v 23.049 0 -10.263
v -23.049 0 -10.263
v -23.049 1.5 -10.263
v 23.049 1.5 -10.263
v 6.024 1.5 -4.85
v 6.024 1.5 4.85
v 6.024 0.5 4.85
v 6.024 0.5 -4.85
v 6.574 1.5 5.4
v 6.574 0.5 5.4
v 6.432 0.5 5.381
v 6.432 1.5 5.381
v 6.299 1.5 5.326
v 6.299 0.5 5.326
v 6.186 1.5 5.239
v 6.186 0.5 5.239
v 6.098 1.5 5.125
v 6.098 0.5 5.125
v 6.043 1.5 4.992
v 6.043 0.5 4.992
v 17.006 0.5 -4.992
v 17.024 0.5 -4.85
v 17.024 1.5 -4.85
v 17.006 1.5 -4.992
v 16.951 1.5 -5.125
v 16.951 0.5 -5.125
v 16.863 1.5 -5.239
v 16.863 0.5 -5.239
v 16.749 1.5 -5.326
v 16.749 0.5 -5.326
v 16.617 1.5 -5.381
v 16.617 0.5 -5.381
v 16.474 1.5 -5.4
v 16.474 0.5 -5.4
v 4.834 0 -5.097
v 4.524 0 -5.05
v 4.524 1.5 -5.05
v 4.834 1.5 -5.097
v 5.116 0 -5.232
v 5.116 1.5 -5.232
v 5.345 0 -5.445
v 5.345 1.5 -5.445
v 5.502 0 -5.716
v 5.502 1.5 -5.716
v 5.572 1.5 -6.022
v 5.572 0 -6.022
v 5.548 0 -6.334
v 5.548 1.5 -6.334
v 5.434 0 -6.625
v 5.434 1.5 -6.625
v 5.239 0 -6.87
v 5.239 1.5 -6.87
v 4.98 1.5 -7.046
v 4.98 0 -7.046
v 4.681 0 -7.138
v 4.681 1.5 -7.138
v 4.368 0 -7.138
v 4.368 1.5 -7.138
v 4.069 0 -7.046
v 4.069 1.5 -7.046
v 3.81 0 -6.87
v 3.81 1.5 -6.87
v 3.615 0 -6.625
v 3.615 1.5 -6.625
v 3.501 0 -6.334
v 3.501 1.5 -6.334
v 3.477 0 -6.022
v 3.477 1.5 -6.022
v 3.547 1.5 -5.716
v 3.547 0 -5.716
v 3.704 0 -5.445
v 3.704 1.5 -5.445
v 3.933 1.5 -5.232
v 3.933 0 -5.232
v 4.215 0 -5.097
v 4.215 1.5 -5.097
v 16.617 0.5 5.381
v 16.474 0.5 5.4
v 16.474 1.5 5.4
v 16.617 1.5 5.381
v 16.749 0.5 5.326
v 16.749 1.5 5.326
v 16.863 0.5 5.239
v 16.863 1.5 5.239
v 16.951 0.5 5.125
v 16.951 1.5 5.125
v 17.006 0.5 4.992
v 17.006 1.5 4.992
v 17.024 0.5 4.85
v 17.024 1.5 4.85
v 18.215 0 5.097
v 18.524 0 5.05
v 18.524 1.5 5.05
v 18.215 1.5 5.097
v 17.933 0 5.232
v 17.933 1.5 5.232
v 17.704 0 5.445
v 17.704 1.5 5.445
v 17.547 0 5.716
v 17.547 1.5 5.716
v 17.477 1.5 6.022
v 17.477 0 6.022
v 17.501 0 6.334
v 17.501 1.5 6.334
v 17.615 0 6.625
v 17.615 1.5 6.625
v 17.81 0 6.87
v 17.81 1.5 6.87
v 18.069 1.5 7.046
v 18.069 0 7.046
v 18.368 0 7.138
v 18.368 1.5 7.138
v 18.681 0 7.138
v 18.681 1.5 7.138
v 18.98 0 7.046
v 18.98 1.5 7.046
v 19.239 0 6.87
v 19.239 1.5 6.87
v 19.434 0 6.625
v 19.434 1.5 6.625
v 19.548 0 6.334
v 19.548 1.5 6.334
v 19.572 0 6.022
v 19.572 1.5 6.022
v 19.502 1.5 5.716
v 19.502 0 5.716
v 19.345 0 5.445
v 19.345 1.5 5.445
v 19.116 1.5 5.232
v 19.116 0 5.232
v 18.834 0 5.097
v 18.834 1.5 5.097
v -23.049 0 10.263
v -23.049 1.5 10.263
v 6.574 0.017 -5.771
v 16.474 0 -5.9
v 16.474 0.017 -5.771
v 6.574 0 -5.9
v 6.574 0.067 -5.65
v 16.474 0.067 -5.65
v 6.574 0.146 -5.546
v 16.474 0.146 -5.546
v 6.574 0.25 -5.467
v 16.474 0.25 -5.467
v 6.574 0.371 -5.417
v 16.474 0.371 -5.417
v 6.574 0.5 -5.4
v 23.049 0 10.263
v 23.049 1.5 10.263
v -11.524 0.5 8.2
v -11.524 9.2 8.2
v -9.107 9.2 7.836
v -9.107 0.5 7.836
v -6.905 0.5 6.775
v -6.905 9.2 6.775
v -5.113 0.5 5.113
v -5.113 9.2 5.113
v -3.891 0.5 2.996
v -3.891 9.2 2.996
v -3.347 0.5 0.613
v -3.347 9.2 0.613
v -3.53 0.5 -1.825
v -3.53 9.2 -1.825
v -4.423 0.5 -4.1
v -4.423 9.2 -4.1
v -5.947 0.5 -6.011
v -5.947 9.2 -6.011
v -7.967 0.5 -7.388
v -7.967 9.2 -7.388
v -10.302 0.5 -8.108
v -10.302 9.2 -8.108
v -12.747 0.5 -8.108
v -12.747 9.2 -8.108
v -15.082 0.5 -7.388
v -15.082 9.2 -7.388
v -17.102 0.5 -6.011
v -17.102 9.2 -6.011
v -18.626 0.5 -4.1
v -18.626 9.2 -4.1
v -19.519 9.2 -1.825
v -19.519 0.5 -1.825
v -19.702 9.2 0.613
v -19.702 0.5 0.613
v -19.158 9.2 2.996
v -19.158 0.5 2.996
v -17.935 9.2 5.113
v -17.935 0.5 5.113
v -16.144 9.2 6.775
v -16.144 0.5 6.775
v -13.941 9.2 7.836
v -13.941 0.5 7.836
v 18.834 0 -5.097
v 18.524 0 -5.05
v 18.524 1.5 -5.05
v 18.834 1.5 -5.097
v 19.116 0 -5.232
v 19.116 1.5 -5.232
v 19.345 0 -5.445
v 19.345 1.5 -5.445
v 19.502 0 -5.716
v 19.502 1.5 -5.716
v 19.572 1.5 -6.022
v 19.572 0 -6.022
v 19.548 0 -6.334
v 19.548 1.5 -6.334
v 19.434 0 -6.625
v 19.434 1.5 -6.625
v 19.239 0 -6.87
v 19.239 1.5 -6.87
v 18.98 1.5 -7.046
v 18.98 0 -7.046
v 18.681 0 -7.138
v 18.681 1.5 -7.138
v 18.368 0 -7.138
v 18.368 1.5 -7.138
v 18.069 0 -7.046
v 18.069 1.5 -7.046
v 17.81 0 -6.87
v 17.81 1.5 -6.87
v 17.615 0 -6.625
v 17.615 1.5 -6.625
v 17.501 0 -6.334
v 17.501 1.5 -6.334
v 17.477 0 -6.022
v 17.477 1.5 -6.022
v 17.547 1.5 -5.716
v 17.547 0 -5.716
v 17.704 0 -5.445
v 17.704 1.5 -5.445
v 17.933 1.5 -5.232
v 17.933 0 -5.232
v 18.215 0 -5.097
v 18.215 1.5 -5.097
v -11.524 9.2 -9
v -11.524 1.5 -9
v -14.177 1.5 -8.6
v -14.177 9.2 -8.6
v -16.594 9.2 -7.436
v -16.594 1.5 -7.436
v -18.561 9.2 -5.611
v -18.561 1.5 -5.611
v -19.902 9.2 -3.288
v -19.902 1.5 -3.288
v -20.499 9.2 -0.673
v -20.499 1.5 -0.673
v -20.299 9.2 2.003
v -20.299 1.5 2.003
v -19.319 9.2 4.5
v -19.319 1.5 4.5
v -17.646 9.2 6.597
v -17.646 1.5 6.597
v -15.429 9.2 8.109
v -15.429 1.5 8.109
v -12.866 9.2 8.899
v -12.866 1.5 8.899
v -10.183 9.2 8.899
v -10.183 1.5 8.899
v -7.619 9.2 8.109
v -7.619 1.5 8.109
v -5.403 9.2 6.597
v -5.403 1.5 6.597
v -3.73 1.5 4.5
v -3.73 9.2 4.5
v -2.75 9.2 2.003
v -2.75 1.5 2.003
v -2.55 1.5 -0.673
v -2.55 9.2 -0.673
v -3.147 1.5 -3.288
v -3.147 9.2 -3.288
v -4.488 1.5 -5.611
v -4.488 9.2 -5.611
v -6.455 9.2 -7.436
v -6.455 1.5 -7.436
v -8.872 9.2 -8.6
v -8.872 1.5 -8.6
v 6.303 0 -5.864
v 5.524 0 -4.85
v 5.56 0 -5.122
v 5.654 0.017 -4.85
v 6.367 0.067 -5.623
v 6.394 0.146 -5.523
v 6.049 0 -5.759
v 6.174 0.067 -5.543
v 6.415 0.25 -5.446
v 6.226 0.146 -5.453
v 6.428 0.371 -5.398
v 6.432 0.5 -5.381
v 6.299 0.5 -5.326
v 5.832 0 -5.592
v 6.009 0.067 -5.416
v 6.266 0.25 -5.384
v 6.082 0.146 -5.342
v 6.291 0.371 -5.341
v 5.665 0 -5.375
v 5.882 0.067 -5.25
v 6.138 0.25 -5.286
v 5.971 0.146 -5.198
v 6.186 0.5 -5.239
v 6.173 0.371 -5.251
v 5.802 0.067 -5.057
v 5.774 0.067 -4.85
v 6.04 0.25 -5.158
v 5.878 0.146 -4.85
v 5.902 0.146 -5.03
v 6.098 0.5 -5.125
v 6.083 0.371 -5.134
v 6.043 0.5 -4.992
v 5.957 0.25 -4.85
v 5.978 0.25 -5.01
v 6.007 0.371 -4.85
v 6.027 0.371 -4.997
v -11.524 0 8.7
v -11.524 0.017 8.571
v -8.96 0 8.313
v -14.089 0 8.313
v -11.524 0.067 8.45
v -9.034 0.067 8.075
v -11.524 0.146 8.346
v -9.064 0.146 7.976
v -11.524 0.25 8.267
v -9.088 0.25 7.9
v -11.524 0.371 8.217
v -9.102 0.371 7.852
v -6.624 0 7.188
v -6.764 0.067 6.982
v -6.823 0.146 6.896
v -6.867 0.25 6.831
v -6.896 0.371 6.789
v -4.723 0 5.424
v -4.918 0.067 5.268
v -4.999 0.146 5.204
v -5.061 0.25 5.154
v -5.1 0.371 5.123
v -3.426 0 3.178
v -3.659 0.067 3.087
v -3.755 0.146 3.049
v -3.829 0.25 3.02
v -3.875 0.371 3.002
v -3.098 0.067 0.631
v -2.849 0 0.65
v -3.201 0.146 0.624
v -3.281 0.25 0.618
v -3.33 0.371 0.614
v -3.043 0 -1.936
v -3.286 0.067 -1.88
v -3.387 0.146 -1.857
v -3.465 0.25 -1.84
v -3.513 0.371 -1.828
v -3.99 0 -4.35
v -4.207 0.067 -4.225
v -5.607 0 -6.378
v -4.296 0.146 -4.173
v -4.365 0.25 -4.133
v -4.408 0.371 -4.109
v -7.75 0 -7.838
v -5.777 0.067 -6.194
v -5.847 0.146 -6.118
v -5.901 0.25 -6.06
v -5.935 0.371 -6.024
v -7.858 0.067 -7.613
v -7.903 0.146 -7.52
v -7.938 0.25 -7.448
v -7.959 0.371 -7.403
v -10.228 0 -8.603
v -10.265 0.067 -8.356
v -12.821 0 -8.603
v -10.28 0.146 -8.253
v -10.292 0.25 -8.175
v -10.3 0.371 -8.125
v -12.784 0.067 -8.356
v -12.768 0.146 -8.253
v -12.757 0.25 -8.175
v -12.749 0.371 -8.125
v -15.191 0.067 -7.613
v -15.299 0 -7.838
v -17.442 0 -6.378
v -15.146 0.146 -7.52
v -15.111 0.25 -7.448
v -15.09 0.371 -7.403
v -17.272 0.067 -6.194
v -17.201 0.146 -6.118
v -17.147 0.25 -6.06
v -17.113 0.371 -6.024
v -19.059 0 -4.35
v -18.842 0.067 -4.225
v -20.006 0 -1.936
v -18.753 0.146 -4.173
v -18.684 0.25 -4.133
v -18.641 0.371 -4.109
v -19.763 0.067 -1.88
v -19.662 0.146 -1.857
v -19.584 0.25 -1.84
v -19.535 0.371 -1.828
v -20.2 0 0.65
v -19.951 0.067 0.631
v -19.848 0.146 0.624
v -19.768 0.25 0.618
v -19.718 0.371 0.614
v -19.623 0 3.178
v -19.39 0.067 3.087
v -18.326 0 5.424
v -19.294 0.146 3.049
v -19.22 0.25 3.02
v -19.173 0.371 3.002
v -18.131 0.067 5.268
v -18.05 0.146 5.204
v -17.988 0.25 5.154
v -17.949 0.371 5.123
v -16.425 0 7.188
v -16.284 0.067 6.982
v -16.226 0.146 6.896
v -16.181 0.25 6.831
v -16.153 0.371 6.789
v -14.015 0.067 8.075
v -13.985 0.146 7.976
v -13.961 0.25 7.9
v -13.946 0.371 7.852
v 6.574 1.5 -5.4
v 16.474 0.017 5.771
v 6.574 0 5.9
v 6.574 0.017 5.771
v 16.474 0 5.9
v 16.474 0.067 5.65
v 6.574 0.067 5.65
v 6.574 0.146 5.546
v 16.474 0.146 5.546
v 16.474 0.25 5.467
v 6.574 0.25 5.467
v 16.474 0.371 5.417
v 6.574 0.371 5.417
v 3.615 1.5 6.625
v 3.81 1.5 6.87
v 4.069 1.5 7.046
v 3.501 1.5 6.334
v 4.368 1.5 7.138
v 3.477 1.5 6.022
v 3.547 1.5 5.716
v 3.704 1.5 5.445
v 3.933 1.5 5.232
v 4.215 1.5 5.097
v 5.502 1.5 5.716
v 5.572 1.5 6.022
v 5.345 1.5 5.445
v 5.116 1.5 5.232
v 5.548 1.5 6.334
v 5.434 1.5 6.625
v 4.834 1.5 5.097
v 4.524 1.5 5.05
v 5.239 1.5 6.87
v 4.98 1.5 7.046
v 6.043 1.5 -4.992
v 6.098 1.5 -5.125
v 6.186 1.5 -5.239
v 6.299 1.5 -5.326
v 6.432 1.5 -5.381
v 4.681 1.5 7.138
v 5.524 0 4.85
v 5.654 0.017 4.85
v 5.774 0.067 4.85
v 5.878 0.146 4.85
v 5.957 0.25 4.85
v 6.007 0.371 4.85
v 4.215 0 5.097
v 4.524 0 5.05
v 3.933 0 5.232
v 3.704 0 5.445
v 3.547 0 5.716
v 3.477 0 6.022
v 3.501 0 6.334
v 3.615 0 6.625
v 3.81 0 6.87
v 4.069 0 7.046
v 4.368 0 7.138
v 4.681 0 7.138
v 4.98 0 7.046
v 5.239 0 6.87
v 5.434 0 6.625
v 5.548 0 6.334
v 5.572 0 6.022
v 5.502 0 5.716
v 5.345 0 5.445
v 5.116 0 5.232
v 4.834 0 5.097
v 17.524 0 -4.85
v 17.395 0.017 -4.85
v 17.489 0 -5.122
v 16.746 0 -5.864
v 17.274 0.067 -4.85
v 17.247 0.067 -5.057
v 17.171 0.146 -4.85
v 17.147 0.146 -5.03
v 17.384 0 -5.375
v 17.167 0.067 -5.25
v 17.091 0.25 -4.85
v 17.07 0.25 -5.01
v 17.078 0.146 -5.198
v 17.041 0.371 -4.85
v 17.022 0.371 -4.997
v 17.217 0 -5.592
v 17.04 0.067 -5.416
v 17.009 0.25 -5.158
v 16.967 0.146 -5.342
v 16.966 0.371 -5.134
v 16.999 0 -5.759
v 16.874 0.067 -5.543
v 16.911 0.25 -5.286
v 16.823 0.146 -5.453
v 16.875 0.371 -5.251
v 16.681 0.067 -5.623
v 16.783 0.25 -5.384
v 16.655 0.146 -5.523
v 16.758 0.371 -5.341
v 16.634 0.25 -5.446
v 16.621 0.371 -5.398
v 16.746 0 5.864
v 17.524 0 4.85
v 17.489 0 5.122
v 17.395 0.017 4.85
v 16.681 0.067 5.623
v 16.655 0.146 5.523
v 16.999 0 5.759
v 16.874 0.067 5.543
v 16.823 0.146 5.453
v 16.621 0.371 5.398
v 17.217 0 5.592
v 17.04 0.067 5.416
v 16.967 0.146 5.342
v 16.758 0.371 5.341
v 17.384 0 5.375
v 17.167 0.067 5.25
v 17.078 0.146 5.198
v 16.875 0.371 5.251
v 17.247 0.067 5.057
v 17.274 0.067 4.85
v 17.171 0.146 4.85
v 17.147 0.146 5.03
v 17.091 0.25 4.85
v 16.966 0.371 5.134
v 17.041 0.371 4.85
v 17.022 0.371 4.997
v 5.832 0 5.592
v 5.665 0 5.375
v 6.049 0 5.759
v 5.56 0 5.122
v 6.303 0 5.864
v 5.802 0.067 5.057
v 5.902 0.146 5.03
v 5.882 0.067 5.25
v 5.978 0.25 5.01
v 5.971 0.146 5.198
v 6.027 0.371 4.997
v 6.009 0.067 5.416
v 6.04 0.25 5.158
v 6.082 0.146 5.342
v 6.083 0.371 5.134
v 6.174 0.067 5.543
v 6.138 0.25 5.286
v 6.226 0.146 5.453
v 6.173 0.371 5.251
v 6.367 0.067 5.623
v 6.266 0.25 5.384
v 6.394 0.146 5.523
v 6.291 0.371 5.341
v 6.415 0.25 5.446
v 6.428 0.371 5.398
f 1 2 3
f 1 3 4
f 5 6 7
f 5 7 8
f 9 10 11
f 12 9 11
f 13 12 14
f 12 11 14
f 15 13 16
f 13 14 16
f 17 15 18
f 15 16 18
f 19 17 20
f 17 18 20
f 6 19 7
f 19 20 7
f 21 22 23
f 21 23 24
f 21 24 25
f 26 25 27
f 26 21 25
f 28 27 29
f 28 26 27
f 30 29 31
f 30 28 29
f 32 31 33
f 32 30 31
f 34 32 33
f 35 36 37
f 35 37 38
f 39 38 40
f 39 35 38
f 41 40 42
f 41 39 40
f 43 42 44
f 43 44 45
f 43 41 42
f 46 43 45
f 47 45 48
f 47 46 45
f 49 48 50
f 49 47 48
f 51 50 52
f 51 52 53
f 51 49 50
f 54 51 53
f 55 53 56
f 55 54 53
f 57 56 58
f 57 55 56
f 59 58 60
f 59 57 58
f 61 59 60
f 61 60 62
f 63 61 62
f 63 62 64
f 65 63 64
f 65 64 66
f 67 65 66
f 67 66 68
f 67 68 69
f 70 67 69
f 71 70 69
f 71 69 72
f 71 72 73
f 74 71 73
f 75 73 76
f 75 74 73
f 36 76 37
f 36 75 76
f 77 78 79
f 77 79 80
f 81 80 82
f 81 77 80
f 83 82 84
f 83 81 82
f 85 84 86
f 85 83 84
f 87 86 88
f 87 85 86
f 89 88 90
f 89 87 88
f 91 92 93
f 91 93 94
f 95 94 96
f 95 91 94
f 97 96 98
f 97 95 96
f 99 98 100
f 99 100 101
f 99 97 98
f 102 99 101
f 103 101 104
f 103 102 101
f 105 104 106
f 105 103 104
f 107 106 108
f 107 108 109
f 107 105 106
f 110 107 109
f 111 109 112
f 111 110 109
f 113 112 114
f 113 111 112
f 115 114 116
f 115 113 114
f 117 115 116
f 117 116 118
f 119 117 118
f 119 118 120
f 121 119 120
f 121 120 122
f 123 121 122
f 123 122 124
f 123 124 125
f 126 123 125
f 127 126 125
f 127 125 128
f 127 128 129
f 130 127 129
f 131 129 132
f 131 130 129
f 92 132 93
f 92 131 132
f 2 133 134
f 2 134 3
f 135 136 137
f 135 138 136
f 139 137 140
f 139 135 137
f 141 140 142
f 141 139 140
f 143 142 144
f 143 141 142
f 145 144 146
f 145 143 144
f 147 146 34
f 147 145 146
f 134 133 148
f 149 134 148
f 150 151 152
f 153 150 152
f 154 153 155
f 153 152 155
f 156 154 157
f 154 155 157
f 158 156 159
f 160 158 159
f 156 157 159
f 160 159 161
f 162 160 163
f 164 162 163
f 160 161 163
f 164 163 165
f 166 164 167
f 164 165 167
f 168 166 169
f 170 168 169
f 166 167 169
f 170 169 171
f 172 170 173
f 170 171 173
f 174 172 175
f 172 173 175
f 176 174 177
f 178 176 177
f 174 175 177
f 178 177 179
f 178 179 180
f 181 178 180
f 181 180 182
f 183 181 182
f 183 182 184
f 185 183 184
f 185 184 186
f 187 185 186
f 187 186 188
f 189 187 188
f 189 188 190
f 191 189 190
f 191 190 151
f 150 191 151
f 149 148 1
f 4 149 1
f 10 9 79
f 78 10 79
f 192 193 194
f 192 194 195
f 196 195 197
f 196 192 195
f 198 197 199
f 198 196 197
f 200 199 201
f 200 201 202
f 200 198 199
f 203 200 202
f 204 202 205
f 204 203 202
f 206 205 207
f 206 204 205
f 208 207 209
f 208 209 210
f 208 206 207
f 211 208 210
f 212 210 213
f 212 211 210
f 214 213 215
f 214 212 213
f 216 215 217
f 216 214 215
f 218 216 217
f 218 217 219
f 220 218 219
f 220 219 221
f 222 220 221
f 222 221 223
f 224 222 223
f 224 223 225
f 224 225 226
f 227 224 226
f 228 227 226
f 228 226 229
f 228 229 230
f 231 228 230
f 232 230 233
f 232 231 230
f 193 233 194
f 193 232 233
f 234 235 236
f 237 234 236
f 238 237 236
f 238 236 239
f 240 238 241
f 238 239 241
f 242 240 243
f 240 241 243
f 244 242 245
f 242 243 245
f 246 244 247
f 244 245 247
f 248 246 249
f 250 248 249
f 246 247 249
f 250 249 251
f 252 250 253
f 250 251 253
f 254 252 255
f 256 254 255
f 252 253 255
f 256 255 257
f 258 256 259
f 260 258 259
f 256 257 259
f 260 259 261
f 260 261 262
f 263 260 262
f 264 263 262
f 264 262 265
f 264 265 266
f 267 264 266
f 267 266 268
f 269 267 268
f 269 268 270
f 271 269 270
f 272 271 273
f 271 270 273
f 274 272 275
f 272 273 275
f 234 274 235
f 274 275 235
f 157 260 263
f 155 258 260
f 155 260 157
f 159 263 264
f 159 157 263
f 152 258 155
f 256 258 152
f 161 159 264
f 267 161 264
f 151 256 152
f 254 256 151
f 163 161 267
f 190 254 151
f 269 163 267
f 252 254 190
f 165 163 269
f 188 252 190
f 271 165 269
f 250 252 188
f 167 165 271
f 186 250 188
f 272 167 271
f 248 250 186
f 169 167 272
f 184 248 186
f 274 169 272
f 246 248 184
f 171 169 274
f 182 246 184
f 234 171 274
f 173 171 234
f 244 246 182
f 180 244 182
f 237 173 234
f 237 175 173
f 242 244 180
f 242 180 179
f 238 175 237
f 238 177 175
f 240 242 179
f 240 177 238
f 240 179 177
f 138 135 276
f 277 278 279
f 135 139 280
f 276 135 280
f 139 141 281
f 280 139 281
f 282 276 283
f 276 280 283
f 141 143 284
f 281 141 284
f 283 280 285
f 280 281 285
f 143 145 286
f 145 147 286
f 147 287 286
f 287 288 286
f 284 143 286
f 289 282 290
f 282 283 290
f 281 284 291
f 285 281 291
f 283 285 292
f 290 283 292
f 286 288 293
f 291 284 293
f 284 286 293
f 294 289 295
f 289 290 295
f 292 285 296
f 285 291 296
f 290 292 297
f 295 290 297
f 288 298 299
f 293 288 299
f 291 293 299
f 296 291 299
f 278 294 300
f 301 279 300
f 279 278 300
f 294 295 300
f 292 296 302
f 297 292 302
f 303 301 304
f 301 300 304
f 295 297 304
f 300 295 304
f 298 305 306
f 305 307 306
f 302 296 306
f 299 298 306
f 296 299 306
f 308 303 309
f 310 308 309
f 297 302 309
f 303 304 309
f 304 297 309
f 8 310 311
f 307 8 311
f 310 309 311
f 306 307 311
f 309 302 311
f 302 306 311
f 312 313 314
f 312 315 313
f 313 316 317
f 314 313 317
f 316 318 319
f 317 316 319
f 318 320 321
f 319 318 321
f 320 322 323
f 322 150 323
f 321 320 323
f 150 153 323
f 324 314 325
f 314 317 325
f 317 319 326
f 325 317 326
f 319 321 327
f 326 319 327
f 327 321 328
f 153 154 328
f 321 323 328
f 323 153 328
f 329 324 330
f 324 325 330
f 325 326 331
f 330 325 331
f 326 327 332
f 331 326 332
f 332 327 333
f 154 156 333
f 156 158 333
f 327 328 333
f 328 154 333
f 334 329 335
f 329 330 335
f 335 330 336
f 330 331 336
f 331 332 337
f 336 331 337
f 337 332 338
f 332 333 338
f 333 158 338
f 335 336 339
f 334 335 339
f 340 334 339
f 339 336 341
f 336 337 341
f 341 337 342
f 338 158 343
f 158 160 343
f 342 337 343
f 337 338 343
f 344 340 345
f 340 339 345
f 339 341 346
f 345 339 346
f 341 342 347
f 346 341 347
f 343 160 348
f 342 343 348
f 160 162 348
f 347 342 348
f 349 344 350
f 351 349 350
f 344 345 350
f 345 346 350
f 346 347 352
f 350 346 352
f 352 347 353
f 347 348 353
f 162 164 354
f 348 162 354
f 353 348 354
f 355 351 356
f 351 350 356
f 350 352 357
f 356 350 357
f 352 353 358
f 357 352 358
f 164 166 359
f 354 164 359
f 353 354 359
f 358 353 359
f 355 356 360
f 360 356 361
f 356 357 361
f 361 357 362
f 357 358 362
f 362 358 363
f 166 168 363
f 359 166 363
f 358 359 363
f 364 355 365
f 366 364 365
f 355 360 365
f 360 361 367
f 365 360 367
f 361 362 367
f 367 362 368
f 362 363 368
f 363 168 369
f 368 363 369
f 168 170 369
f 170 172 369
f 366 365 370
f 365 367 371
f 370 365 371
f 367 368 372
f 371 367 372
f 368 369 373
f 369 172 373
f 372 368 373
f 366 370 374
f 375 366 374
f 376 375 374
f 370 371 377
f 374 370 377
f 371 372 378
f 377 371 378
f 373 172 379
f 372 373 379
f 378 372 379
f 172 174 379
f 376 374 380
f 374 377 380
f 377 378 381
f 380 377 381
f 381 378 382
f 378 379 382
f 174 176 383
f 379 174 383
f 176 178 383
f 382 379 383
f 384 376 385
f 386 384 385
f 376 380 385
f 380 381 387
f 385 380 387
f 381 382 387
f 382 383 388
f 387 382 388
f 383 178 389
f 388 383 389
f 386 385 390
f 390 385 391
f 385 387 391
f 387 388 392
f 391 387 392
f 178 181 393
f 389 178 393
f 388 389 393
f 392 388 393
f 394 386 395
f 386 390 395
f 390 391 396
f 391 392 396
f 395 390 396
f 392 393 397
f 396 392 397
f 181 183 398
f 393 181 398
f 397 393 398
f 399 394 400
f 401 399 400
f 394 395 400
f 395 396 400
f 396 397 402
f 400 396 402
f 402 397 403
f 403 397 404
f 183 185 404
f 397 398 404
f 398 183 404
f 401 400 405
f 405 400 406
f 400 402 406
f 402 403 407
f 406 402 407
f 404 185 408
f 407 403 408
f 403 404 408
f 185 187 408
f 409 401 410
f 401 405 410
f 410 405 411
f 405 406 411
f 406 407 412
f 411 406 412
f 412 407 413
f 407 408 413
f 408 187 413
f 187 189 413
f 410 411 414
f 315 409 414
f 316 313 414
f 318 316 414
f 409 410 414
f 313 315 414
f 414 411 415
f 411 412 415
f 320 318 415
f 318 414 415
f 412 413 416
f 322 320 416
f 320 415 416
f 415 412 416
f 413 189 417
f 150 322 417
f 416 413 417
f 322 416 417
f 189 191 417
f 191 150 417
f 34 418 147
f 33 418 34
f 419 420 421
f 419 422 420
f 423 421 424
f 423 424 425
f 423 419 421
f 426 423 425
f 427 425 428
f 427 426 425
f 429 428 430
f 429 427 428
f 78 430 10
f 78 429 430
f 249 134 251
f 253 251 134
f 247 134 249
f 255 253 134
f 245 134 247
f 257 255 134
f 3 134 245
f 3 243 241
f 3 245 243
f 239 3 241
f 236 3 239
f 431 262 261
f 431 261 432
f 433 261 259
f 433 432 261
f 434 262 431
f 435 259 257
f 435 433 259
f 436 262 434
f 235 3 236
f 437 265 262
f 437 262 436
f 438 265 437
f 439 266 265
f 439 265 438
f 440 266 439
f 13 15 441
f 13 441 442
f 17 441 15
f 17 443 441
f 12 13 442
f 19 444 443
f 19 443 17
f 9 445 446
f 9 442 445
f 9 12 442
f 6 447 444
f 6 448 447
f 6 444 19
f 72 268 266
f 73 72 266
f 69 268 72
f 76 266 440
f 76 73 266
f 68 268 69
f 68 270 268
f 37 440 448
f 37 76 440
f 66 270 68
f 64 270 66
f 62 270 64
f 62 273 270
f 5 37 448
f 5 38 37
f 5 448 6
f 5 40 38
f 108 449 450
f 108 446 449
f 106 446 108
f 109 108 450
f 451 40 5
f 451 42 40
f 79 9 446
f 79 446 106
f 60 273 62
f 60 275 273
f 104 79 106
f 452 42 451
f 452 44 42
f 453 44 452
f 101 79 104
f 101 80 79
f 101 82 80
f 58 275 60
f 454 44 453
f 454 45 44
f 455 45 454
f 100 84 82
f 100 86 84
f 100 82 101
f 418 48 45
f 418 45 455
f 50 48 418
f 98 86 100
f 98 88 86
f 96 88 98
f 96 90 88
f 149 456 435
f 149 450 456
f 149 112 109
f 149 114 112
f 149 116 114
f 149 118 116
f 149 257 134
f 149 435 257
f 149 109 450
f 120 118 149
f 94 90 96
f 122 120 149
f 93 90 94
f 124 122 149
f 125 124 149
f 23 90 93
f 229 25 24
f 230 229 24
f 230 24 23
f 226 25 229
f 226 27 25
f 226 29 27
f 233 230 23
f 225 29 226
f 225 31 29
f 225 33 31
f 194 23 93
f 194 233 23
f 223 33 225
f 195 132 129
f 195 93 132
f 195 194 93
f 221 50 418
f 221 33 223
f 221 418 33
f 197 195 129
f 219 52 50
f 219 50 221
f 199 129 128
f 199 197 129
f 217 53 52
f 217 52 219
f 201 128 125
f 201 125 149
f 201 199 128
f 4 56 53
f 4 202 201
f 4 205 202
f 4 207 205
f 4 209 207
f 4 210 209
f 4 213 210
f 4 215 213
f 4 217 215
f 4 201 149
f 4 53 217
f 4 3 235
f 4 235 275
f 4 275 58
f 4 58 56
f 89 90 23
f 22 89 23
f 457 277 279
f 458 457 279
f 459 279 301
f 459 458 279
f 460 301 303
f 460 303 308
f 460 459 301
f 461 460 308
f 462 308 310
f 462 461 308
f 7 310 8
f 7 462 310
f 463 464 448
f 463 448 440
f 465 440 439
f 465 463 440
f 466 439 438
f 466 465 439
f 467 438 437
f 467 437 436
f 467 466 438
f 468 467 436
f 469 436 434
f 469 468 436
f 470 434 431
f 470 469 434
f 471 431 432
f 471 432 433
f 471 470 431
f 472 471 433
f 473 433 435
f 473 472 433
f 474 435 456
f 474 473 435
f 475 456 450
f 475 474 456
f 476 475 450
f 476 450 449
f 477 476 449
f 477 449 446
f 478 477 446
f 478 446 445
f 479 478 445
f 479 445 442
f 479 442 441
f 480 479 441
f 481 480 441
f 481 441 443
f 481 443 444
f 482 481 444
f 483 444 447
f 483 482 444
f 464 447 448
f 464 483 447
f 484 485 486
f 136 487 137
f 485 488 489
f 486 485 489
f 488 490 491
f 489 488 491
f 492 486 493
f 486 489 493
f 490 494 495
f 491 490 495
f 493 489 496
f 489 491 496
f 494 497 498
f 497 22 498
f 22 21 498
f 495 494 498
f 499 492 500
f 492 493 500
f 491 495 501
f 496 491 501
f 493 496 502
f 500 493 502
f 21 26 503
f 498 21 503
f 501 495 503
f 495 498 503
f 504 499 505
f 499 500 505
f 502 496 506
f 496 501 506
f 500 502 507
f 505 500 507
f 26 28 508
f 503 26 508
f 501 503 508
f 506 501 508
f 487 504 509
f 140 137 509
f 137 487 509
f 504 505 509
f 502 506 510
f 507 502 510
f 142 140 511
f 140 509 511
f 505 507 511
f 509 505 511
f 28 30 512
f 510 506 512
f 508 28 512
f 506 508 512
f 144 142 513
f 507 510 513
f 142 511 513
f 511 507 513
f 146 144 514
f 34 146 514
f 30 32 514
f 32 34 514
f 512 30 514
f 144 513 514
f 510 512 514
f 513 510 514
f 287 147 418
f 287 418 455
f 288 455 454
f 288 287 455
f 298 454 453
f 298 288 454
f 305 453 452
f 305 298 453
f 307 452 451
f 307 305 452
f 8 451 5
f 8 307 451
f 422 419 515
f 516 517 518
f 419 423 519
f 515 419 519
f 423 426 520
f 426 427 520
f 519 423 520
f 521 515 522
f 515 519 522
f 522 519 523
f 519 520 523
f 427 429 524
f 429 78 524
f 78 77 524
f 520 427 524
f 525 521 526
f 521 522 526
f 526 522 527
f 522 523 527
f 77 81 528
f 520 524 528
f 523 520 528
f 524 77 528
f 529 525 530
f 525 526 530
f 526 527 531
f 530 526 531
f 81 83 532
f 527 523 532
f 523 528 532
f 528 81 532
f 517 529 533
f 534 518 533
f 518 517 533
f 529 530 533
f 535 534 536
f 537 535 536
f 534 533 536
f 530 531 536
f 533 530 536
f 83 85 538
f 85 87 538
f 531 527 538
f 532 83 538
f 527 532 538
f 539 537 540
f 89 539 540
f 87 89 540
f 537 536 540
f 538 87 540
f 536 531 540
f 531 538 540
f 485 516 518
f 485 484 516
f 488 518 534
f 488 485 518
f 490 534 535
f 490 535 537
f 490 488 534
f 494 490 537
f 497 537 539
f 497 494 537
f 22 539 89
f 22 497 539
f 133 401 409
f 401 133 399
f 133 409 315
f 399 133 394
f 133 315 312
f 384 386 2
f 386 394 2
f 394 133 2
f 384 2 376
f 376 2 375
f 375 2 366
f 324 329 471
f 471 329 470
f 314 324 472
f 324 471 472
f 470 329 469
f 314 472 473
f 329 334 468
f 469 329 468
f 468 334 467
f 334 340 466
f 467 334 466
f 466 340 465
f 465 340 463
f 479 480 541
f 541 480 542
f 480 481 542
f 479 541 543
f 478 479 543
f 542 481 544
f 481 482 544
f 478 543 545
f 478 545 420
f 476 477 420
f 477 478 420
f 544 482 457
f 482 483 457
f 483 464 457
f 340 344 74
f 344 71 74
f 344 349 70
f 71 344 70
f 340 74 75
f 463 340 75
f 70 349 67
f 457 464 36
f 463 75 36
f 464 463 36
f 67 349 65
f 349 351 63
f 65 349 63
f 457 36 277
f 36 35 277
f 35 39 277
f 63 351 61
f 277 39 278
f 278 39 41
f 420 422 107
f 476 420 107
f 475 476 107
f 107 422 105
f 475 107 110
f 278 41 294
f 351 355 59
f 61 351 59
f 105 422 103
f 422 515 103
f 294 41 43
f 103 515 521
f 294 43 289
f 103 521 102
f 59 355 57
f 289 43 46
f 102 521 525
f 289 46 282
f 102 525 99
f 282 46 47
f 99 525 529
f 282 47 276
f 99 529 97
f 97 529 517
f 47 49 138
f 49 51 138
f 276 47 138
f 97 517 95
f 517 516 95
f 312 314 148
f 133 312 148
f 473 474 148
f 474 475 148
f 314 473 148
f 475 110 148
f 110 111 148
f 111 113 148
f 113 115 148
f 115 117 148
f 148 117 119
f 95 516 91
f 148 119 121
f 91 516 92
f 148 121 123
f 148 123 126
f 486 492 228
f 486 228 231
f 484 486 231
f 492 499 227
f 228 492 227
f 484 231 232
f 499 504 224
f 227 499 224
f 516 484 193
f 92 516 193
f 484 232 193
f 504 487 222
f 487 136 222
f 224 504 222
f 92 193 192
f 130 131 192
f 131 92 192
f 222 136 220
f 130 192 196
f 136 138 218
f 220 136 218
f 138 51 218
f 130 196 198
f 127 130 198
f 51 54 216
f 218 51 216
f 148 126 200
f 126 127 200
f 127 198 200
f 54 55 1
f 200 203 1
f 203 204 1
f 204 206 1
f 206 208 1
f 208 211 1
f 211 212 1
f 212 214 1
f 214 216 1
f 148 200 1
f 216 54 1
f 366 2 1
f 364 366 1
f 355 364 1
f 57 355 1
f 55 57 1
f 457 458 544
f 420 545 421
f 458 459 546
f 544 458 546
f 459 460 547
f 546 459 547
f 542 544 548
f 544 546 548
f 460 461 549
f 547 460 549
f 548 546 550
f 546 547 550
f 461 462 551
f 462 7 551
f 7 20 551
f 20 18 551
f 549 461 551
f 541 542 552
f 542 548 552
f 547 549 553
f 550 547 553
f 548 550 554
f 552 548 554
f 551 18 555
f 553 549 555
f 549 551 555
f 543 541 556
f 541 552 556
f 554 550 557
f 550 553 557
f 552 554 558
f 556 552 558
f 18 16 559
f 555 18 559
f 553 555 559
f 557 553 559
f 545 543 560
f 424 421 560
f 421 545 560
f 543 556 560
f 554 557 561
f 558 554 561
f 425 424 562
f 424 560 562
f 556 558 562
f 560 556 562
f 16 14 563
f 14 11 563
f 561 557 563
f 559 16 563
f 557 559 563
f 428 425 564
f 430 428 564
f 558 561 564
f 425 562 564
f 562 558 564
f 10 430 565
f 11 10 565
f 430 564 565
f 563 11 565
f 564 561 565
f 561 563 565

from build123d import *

# Parameters (mm, degrees)
CROQUIS1_W              = 46.097746062
CROQUIS1_H              = 20.525775368
CROQUIS1_R              = 1.05
SALIENTE_EXTRUIR1_DEPTH = 1.5
CROQUIS4_W              = 11
CROQUIS4_H              = 10.8
CORTAR_EXTRUIR1_DEPTH   = 1.5
REDONDEO1_R             = 0.55
CROQUIS7_R              = 9
SALIENTE_EXTRUIR3_DEPTH = 7.7
CROQUIS8_R              = 8.2
CORTAR_EXTRUIR3_DEPTH   = 27.855491275
REDONDEO2_R             = 0.5
REDONDEO3_R             = 0.5


with BuildPart() as part:
    # Croquis1 → Saliente-Extruir1 (new body)
    with BuildSketch(Plane(origin=(0, 0, 0), x_dir=(1, 0, 0), z_dir=(0, 1, 0))):
        Rectangle(CROQUIS1_W, CROQUIS1_H)
        with Locations(Location((4.524436516, 6.1, 0), (0, 0, 270))):
            Circle(CROQUIS1_R, mode=Mode.SUBTRACT)
        with Locations(Location((18.524436516, 6.1, 0), (0, 0, 270))):
            Circle(CROQUIS1_R, mode=Mode.SUBTRACT)
        with Locations(Location((18.524436516, -6.1, 0), (0, 0, 90))):
            Circle(CROQUIS1_R, mode=Mode.SUBTRACT)
        with Locations(Location((4.524436516, -6.1, 0), (0, 0, 90))):
            Circle(CROQUIS1_R, mode=Mode.SUBTRACT)
    extrude(amount=SALIENTE_EXTRUIR1_DEPTH)

    # Croquis4 → Cortar-Extruir1 (cut)
    with BuildSketch(Plane(origin=(0, 1.5, 0), x_dir=(1, 0, 0), z_dir=(0, 1, 0))):
        with Locations((11.524436516, 0)):
            Rectangle(CROQUIS4_W, CROQUIS4_H)
    extrude(amount=-CORTAR_EXTRUIR1_DEPTH, mode=Mode.SUBTRACT)

    # Redondeo1
    redondeo1_edges = [part.edges().sort_by_distance(p)[0] for p in [
        (6.024436516, 0.75, -5.4),
        (17.024436516, 0.75, -5.4),
        (17.024436516, 0.75, 5.4),
        (6.024436516, 0.75, 5.4),
    ]]
    fillet(redondeo1_edges, radius=REDONDEO1_R)

    # Croquis7 → Saliente-Extruir3 (add)
    with BuildSketch(Plane(origin=(0, 1.5, 0), x_dir=(1, 0, 0), z_dir=(0, 1, 0))):
        with Locations(Location((-11.524436516, 0, 0), (0, 0, 90))):
            Circle(CROQUIS7_R)
    extrude(amount=SALIENTE_EXTRUIR3_DEPTH)

    # Croquis8 → Cortar-Extruir3 (cut, through all)
    with BuildSketch(Plane(origin=(0, 9.2, 0), x_dir=(1, 0, 0), z_dir=(0, 1, 0))):
        with Locations(Location((-11.524436516, 0, 0), (0, 0, 270))):
            Circle(CROQUIS8_R)
    extrude(amount=-CORTAR_EXTRUIR3_DEPTH, mode=Mode.SUBTRACT)

    # Redondeo2
    redondeo2_edges = [part.edges().sort_by_distance(p)[0] for p in [
        (17.024436516, 0, 0),
        (11.524436516, 0, 5.4),
        (6.024436516, 0, 0),
        (11.524436516, 0, -5.4),
        (16.863345245, 0, 5.23890873),
        (6.185527786, 0, 5.23890873),
        (16.863345245, 0, -5.23890873),
        (6.185527786, 0, -5.23890873),
    ]]
    fillet(redondeo2_edges, radius=REDONDEO2_R)

    # Redondeo3
    redondeo3_edges = [part.edges().sort_by_distance(p)[0] for p in [
        (-11.524436516, 0, -8.2),
    ]]
    fillet(redondeo3_edges, radius=REDONDEO3_R)


solid = part.part
